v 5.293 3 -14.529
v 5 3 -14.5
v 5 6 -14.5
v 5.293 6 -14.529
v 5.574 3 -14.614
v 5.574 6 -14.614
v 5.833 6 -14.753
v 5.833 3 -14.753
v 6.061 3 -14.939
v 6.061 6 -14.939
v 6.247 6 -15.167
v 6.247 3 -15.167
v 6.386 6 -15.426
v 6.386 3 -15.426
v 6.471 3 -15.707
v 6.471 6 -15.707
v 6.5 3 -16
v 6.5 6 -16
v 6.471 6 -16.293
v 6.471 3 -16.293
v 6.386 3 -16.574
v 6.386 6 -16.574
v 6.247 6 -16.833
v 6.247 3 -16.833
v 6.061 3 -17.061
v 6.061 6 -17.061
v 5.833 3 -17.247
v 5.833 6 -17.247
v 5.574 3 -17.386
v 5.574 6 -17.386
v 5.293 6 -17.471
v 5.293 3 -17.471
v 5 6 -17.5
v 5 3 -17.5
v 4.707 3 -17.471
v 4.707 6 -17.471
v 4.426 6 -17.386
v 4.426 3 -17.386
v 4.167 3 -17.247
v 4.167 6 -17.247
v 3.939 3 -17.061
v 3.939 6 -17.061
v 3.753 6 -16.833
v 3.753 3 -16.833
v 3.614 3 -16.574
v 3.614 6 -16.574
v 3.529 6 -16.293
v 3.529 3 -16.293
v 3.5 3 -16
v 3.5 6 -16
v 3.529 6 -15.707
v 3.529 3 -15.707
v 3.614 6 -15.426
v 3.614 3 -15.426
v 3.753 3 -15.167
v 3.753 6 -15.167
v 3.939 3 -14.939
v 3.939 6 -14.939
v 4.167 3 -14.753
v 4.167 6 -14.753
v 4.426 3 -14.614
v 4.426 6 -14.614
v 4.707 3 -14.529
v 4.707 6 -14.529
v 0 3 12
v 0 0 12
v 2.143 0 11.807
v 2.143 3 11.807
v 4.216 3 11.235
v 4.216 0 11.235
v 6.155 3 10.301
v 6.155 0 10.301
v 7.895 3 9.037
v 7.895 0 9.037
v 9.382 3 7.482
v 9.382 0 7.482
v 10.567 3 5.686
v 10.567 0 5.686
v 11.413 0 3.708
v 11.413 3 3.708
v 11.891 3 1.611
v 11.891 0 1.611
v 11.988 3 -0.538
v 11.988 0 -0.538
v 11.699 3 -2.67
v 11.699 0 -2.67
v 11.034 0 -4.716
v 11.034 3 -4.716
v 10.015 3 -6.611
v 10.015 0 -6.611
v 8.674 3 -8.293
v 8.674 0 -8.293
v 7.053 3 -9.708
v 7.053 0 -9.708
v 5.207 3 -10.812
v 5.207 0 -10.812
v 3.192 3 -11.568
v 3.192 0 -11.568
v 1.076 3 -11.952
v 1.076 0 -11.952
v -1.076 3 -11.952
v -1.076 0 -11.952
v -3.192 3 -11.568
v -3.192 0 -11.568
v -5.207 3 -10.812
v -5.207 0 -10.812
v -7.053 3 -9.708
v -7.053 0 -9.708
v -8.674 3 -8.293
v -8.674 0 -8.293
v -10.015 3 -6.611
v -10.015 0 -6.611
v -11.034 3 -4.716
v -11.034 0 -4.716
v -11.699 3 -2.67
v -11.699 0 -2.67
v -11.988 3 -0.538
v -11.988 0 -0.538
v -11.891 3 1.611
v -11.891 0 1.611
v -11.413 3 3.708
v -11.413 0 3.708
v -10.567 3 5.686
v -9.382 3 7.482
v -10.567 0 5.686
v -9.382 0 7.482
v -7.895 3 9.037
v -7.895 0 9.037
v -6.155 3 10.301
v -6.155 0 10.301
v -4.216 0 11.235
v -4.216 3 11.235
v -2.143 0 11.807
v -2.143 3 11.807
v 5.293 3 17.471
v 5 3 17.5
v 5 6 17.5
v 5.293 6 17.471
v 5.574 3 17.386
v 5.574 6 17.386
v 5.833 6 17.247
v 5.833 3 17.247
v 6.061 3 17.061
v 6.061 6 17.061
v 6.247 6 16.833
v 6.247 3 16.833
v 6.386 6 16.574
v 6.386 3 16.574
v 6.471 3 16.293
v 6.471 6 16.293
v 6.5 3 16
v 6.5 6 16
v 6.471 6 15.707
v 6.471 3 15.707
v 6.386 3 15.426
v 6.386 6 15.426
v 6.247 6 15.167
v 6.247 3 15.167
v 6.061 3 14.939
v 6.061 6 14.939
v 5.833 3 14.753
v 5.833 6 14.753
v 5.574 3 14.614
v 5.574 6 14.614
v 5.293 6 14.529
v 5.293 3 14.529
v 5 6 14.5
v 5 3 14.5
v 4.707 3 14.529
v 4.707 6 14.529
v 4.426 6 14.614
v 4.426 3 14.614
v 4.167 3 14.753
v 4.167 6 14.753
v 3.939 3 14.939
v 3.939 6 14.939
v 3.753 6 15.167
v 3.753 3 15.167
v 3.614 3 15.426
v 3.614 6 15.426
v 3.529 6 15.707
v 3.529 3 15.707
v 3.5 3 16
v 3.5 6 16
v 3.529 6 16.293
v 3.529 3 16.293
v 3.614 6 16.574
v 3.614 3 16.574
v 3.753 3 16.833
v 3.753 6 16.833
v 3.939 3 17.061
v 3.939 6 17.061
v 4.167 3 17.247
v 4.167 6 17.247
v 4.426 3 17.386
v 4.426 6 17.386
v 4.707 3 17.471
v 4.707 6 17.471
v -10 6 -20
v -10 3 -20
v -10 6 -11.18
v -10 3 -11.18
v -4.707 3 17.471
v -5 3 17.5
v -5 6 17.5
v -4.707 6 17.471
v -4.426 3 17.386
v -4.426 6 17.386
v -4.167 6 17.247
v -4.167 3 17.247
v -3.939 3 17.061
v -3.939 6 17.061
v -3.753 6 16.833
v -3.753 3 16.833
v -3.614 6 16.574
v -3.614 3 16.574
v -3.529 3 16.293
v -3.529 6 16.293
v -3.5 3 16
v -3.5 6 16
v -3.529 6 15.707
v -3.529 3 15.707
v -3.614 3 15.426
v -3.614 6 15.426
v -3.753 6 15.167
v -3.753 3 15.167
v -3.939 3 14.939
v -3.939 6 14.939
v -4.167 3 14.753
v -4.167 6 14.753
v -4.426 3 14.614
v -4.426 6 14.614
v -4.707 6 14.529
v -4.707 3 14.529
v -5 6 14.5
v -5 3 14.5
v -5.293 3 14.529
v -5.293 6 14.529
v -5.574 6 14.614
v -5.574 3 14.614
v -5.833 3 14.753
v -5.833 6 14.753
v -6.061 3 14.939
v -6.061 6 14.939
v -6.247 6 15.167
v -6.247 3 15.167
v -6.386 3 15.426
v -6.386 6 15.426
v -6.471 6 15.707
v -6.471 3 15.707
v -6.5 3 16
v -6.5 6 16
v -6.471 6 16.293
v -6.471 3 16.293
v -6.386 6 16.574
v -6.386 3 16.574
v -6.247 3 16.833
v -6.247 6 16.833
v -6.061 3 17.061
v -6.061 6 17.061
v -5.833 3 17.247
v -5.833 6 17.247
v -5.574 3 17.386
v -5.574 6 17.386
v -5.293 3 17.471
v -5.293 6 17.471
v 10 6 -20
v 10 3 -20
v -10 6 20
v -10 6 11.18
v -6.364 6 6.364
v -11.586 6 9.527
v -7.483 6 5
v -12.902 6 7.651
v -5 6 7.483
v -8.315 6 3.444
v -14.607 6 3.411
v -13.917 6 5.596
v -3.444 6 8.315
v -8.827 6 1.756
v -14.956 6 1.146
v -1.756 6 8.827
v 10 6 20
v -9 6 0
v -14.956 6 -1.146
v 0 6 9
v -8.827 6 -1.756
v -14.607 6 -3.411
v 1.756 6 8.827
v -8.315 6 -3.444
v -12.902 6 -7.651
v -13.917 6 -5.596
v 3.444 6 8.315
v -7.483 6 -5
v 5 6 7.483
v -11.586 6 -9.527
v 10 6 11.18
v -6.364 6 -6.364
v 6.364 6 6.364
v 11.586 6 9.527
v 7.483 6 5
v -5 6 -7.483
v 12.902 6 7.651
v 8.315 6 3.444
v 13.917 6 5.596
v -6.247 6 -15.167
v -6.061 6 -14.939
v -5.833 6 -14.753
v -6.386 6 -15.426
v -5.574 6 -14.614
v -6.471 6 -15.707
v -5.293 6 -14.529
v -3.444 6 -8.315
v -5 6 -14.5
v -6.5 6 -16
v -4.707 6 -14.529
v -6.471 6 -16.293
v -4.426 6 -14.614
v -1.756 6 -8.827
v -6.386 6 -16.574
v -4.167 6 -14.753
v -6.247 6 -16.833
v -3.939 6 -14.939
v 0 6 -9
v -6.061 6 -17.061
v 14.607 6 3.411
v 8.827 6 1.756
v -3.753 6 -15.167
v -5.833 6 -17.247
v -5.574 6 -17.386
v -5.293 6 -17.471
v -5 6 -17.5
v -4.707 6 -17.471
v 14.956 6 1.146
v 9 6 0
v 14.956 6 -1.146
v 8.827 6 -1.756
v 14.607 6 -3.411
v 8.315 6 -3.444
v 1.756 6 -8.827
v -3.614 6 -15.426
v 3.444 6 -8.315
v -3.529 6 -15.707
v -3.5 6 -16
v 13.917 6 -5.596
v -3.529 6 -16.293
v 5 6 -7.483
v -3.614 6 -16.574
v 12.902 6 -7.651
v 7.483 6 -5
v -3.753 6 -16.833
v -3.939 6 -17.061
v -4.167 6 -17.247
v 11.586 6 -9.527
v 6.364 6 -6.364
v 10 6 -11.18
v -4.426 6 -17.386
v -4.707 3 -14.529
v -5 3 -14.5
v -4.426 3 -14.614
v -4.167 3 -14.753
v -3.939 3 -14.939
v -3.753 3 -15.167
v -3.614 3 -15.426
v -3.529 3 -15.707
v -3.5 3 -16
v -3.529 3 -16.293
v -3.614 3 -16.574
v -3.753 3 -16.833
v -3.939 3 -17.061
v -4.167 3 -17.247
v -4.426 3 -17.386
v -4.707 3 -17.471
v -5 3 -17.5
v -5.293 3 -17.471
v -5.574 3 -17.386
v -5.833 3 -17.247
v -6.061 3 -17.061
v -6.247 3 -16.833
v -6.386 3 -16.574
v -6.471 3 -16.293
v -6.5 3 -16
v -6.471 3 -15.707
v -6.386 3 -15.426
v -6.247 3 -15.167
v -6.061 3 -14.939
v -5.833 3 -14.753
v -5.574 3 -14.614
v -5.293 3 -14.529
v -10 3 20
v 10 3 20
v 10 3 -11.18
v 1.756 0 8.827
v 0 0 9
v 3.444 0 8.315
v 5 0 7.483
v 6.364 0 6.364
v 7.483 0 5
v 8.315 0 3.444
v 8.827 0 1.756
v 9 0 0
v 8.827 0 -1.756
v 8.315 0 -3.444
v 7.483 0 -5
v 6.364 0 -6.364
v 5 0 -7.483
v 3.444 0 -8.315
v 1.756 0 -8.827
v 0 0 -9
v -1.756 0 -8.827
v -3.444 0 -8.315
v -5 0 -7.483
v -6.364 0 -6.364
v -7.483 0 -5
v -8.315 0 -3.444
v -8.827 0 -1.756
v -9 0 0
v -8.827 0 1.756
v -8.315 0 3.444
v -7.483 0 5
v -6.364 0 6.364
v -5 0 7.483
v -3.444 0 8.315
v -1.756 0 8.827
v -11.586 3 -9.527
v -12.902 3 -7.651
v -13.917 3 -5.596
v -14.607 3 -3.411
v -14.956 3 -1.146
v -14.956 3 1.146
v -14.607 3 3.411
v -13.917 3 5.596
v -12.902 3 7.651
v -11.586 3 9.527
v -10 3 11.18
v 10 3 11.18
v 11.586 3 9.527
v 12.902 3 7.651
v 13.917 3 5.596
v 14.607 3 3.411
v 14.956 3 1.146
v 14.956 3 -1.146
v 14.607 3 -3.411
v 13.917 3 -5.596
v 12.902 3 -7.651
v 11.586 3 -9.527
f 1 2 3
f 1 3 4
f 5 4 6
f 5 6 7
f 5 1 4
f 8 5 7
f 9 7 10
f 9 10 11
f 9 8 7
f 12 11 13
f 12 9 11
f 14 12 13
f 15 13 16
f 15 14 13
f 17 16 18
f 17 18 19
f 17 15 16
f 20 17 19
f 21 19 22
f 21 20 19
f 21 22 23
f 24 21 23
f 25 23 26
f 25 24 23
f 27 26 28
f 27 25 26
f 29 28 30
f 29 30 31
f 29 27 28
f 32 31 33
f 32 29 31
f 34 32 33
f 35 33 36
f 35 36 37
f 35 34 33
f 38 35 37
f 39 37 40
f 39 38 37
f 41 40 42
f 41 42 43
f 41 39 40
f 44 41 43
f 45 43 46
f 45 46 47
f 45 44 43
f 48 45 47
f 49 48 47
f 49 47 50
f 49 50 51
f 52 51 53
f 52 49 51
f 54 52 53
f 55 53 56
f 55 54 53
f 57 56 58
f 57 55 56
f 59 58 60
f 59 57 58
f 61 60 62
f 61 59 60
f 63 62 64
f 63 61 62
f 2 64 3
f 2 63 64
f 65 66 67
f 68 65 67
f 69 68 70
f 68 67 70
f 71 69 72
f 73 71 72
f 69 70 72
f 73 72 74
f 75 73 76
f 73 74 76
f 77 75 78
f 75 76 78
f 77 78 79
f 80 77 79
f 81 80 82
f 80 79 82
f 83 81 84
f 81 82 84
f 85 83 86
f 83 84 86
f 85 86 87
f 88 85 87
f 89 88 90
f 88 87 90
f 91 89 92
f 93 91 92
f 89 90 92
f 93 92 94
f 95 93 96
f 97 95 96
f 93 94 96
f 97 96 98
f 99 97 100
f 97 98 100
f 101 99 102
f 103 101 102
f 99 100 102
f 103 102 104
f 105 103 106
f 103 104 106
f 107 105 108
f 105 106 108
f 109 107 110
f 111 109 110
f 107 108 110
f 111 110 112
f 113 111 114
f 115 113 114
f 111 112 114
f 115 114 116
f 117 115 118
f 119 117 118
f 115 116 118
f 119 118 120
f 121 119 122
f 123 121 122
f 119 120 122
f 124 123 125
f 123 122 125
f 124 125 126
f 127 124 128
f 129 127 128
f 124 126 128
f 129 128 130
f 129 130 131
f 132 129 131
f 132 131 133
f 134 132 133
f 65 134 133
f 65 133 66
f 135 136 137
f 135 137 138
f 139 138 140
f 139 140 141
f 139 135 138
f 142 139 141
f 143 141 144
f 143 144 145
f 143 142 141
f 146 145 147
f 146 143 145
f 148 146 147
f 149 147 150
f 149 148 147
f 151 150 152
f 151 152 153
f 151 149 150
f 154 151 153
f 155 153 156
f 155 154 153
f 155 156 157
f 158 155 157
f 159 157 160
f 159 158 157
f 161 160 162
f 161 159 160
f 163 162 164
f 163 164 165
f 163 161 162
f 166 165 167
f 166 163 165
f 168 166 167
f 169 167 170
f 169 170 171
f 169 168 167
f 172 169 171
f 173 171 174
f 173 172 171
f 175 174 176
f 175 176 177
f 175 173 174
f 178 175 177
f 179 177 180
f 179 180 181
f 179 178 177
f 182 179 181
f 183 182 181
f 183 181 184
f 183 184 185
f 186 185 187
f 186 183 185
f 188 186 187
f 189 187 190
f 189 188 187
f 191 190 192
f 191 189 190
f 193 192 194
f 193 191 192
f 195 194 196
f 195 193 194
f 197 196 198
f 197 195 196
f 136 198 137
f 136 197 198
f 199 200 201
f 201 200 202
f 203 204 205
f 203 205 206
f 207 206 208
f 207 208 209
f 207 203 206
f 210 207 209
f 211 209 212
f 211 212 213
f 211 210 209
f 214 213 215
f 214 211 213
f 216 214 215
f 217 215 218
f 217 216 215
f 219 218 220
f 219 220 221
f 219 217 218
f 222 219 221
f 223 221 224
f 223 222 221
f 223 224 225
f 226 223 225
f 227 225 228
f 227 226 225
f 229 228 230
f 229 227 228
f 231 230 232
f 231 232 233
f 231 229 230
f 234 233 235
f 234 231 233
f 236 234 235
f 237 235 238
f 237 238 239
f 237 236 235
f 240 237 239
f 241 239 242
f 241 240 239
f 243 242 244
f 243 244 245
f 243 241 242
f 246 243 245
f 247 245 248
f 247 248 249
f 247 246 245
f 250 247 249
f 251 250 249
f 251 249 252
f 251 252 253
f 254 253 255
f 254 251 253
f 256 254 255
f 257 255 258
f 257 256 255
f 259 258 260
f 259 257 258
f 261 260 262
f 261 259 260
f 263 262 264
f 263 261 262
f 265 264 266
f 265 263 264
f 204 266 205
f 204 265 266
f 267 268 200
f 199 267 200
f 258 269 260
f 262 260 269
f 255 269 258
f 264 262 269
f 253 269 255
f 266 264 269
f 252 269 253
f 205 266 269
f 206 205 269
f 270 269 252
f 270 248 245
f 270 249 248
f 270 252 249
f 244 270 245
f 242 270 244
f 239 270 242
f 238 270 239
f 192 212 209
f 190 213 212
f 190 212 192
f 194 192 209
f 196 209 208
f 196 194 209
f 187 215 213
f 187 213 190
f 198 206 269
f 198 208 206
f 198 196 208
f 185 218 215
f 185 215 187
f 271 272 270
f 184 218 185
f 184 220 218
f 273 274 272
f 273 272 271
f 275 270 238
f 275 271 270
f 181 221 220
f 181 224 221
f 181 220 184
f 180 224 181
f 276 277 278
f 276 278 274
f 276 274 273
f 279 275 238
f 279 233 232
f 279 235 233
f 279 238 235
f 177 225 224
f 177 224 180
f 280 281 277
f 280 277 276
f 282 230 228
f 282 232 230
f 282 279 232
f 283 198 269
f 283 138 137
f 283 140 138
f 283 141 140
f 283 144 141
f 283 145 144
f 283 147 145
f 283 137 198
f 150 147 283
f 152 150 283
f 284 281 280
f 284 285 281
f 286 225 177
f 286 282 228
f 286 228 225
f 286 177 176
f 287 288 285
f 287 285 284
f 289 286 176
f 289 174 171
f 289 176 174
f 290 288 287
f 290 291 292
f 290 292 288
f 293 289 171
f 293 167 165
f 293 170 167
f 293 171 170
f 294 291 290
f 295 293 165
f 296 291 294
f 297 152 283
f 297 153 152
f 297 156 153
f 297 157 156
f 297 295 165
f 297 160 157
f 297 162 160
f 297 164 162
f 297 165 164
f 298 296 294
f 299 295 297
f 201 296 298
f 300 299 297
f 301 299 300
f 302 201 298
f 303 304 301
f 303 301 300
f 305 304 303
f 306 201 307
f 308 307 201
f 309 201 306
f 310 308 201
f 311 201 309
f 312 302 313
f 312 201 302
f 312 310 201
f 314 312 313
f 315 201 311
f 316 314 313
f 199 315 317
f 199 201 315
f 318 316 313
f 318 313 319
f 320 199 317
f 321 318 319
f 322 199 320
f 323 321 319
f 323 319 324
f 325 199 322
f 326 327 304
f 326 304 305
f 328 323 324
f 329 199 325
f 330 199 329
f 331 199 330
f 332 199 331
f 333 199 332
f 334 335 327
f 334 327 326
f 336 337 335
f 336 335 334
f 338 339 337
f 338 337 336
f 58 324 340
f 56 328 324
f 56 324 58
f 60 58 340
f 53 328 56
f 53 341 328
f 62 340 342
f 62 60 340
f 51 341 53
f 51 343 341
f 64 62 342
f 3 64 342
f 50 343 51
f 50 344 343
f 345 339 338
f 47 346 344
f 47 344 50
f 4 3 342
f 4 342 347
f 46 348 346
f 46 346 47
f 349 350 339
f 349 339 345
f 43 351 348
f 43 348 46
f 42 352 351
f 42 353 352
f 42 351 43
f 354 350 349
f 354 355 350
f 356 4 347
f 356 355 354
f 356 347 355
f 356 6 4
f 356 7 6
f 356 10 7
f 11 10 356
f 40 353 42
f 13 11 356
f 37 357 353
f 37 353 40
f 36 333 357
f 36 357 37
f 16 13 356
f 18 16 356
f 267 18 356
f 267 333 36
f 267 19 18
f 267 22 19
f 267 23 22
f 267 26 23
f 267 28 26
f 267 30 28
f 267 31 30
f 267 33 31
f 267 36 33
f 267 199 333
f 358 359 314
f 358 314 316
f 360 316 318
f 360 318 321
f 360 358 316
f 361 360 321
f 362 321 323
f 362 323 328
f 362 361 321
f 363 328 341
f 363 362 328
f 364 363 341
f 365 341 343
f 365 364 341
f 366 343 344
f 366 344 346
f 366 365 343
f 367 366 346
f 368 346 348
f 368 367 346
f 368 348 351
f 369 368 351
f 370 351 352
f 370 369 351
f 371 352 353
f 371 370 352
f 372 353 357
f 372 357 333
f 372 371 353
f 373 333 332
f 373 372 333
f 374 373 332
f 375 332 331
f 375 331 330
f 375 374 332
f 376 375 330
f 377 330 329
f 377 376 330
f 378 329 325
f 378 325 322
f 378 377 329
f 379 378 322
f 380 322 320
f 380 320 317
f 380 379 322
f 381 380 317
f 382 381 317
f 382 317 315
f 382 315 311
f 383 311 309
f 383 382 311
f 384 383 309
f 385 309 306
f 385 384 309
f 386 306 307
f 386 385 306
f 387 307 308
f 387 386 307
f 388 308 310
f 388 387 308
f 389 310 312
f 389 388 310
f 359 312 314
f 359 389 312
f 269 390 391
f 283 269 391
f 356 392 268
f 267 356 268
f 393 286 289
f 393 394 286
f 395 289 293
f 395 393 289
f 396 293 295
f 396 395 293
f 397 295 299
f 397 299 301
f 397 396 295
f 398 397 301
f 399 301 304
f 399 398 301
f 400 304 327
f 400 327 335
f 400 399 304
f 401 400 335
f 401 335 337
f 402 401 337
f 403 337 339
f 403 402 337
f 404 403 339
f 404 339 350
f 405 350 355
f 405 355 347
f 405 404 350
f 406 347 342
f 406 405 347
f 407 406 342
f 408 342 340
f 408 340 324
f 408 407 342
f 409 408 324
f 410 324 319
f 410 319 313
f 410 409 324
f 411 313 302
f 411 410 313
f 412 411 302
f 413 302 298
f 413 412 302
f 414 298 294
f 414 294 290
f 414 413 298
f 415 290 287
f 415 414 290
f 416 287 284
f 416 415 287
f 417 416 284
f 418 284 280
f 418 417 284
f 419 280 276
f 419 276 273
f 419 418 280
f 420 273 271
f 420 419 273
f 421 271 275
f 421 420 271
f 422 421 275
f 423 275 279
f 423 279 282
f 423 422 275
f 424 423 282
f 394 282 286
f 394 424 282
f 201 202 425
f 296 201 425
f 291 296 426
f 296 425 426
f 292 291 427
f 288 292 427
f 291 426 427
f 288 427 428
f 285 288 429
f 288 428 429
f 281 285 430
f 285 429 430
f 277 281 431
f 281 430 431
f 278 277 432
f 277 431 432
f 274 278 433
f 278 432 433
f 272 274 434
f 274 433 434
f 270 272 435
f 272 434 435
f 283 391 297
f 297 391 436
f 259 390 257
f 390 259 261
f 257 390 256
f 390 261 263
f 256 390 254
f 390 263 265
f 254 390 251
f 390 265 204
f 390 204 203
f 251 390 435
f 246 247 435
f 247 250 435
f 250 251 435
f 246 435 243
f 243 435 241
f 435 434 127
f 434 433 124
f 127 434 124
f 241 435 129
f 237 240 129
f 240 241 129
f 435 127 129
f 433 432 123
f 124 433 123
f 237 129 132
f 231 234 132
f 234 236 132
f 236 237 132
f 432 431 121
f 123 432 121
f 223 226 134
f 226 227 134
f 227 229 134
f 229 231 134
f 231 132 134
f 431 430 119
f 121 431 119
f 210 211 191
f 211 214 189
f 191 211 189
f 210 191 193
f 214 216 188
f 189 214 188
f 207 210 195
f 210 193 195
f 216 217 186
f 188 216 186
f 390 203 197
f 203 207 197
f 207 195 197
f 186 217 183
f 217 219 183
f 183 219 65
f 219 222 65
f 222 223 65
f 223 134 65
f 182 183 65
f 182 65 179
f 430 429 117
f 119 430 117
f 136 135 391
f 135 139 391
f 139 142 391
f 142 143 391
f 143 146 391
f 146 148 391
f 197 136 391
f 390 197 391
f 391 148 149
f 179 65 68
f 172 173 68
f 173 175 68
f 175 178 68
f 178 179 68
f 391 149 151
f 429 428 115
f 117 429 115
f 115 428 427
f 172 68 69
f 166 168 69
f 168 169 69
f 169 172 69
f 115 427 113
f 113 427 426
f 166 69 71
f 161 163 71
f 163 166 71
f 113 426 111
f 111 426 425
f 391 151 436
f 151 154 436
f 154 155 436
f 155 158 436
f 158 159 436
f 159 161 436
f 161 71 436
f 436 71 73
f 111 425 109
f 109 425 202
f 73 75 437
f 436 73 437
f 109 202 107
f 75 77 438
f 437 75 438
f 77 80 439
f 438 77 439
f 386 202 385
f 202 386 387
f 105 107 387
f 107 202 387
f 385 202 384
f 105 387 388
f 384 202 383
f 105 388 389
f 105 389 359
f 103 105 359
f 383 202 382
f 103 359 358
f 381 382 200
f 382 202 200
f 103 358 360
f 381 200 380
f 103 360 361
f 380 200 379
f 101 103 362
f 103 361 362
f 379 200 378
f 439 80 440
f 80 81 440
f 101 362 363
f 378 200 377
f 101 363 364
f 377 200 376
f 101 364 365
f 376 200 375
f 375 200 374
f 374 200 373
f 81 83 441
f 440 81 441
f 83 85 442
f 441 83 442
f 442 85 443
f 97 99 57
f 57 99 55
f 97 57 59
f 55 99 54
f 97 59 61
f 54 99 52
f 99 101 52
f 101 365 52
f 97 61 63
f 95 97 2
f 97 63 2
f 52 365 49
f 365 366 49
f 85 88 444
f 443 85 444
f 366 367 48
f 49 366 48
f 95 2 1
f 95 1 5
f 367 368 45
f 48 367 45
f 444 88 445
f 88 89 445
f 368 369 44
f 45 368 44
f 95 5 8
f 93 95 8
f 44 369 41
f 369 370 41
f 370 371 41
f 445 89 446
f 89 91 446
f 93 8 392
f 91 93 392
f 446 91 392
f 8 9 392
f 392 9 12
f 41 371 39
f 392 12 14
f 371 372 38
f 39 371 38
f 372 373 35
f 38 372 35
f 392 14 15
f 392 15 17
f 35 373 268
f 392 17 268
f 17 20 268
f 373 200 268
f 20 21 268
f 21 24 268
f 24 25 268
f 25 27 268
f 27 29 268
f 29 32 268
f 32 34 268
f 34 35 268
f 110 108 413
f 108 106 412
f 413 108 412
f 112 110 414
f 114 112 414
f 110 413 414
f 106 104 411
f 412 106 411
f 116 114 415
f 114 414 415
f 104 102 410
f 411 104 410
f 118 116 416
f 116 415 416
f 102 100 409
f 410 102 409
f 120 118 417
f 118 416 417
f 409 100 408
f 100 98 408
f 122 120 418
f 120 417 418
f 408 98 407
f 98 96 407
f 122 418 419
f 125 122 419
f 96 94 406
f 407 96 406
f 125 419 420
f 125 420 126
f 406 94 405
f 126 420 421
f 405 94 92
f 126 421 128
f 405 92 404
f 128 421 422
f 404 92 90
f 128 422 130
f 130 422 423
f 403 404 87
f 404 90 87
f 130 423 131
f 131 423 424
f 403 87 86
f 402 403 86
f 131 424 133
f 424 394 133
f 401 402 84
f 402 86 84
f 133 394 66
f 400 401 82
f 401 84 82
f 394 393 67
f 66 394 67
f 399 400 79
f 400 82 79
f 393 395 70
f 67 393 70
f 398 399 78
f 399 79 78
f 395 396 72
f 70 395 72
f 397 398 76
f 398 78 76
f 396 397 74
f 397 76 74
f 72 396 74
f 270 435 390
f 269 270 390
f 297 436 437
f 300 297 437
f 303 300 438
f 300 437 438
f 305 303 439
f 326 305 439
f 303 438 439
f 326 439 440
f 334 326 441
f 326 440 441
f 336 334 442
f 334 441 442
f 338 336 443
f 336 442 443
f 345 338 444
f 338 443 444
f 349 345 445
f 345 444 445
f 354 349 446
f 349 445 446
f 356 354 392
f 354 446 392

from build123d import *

# Parameters (mm, degrees)
SKETCH_1_R      = 12
SKETCH_1_R_2    = 9
EXTRUDE_1_DEPTH = 3
SKETCH_2_R      = 9
SKETCH_2_R_2    = 1.5
EXTRUDE_2_DEPTH = 3


with BuildPart() as part:
    # 草图1 → 凸台-拉伸1 (new body)
    with BuildSketch(Plane(origin=(0, 0, 0), x_dir=(1, 0, 0), z_dir=(0, 1, 0))):
        with Locations(Location((0, 0, 0), (0, 0, 270))):
            Circle(SKETCH_1_R)
        with Locations(Location((0, 0, 0), (0, 0, 270))):
            Circle(SKETCH_1_R_2, mode=Mode.SUBTRACT)
    extrude(amount=EXTRUDE_1_DEPTH)

    # 草图2 → 凸台-拉伸2 (add)
    with BuildSketch(Plane(origin=(0, 3, 0), x_dir=(1, 0, 0), z_dir=(0, 1, 0))):
        with BuildLine():
            Line((-10, -11.180339887), (-10, -20))
            Line((-10, -20), (10, -20))
            Line((10, -20), (10, -11.180339887))
            ThreePointArc((10, -11.180339887), (15, 0), (10, 11.180339887))
            Line((10, 11.180339887), (10, 20))
            Line((10, 20), (-10, 20))
            Line((-10, 20), (-10, 11.180339887))
            ThreePointArc((-10, 11.180339887), (-15, 0), (-10, -11.180339887))
        make_face()
        with Locations(Location((0, 0, 0), (0, 0, 270))):
            Circle(SKETCH_2_R, mode=Mode.SUBTRACT)
        with Locations(Location((-5, 16, 0), (0, 0, 270))):
            Circle(SKETCH_2_R_2, mode=Mode.SUBTRACT)
        with Locations(Location((5, 16, 0), (0, 0, 270))):
            Circle(SKETCH_2_R_2, mode=Mode.SUBTRACT)
        with Locations(Location((-5, -16, 0), (0, 0, 270))):
            Circle(SKETCH_2_R_2, mode=Mode.SUBTRACT)
        with Locations(Location((5, -16, 0), (0, 0, 270))):
            Circle(SKETCH_2_R_2, mode=Mode.SUBTRACT)
    extrude(amount=EXTRUDE_2_DEPTH)


solid = part.part
